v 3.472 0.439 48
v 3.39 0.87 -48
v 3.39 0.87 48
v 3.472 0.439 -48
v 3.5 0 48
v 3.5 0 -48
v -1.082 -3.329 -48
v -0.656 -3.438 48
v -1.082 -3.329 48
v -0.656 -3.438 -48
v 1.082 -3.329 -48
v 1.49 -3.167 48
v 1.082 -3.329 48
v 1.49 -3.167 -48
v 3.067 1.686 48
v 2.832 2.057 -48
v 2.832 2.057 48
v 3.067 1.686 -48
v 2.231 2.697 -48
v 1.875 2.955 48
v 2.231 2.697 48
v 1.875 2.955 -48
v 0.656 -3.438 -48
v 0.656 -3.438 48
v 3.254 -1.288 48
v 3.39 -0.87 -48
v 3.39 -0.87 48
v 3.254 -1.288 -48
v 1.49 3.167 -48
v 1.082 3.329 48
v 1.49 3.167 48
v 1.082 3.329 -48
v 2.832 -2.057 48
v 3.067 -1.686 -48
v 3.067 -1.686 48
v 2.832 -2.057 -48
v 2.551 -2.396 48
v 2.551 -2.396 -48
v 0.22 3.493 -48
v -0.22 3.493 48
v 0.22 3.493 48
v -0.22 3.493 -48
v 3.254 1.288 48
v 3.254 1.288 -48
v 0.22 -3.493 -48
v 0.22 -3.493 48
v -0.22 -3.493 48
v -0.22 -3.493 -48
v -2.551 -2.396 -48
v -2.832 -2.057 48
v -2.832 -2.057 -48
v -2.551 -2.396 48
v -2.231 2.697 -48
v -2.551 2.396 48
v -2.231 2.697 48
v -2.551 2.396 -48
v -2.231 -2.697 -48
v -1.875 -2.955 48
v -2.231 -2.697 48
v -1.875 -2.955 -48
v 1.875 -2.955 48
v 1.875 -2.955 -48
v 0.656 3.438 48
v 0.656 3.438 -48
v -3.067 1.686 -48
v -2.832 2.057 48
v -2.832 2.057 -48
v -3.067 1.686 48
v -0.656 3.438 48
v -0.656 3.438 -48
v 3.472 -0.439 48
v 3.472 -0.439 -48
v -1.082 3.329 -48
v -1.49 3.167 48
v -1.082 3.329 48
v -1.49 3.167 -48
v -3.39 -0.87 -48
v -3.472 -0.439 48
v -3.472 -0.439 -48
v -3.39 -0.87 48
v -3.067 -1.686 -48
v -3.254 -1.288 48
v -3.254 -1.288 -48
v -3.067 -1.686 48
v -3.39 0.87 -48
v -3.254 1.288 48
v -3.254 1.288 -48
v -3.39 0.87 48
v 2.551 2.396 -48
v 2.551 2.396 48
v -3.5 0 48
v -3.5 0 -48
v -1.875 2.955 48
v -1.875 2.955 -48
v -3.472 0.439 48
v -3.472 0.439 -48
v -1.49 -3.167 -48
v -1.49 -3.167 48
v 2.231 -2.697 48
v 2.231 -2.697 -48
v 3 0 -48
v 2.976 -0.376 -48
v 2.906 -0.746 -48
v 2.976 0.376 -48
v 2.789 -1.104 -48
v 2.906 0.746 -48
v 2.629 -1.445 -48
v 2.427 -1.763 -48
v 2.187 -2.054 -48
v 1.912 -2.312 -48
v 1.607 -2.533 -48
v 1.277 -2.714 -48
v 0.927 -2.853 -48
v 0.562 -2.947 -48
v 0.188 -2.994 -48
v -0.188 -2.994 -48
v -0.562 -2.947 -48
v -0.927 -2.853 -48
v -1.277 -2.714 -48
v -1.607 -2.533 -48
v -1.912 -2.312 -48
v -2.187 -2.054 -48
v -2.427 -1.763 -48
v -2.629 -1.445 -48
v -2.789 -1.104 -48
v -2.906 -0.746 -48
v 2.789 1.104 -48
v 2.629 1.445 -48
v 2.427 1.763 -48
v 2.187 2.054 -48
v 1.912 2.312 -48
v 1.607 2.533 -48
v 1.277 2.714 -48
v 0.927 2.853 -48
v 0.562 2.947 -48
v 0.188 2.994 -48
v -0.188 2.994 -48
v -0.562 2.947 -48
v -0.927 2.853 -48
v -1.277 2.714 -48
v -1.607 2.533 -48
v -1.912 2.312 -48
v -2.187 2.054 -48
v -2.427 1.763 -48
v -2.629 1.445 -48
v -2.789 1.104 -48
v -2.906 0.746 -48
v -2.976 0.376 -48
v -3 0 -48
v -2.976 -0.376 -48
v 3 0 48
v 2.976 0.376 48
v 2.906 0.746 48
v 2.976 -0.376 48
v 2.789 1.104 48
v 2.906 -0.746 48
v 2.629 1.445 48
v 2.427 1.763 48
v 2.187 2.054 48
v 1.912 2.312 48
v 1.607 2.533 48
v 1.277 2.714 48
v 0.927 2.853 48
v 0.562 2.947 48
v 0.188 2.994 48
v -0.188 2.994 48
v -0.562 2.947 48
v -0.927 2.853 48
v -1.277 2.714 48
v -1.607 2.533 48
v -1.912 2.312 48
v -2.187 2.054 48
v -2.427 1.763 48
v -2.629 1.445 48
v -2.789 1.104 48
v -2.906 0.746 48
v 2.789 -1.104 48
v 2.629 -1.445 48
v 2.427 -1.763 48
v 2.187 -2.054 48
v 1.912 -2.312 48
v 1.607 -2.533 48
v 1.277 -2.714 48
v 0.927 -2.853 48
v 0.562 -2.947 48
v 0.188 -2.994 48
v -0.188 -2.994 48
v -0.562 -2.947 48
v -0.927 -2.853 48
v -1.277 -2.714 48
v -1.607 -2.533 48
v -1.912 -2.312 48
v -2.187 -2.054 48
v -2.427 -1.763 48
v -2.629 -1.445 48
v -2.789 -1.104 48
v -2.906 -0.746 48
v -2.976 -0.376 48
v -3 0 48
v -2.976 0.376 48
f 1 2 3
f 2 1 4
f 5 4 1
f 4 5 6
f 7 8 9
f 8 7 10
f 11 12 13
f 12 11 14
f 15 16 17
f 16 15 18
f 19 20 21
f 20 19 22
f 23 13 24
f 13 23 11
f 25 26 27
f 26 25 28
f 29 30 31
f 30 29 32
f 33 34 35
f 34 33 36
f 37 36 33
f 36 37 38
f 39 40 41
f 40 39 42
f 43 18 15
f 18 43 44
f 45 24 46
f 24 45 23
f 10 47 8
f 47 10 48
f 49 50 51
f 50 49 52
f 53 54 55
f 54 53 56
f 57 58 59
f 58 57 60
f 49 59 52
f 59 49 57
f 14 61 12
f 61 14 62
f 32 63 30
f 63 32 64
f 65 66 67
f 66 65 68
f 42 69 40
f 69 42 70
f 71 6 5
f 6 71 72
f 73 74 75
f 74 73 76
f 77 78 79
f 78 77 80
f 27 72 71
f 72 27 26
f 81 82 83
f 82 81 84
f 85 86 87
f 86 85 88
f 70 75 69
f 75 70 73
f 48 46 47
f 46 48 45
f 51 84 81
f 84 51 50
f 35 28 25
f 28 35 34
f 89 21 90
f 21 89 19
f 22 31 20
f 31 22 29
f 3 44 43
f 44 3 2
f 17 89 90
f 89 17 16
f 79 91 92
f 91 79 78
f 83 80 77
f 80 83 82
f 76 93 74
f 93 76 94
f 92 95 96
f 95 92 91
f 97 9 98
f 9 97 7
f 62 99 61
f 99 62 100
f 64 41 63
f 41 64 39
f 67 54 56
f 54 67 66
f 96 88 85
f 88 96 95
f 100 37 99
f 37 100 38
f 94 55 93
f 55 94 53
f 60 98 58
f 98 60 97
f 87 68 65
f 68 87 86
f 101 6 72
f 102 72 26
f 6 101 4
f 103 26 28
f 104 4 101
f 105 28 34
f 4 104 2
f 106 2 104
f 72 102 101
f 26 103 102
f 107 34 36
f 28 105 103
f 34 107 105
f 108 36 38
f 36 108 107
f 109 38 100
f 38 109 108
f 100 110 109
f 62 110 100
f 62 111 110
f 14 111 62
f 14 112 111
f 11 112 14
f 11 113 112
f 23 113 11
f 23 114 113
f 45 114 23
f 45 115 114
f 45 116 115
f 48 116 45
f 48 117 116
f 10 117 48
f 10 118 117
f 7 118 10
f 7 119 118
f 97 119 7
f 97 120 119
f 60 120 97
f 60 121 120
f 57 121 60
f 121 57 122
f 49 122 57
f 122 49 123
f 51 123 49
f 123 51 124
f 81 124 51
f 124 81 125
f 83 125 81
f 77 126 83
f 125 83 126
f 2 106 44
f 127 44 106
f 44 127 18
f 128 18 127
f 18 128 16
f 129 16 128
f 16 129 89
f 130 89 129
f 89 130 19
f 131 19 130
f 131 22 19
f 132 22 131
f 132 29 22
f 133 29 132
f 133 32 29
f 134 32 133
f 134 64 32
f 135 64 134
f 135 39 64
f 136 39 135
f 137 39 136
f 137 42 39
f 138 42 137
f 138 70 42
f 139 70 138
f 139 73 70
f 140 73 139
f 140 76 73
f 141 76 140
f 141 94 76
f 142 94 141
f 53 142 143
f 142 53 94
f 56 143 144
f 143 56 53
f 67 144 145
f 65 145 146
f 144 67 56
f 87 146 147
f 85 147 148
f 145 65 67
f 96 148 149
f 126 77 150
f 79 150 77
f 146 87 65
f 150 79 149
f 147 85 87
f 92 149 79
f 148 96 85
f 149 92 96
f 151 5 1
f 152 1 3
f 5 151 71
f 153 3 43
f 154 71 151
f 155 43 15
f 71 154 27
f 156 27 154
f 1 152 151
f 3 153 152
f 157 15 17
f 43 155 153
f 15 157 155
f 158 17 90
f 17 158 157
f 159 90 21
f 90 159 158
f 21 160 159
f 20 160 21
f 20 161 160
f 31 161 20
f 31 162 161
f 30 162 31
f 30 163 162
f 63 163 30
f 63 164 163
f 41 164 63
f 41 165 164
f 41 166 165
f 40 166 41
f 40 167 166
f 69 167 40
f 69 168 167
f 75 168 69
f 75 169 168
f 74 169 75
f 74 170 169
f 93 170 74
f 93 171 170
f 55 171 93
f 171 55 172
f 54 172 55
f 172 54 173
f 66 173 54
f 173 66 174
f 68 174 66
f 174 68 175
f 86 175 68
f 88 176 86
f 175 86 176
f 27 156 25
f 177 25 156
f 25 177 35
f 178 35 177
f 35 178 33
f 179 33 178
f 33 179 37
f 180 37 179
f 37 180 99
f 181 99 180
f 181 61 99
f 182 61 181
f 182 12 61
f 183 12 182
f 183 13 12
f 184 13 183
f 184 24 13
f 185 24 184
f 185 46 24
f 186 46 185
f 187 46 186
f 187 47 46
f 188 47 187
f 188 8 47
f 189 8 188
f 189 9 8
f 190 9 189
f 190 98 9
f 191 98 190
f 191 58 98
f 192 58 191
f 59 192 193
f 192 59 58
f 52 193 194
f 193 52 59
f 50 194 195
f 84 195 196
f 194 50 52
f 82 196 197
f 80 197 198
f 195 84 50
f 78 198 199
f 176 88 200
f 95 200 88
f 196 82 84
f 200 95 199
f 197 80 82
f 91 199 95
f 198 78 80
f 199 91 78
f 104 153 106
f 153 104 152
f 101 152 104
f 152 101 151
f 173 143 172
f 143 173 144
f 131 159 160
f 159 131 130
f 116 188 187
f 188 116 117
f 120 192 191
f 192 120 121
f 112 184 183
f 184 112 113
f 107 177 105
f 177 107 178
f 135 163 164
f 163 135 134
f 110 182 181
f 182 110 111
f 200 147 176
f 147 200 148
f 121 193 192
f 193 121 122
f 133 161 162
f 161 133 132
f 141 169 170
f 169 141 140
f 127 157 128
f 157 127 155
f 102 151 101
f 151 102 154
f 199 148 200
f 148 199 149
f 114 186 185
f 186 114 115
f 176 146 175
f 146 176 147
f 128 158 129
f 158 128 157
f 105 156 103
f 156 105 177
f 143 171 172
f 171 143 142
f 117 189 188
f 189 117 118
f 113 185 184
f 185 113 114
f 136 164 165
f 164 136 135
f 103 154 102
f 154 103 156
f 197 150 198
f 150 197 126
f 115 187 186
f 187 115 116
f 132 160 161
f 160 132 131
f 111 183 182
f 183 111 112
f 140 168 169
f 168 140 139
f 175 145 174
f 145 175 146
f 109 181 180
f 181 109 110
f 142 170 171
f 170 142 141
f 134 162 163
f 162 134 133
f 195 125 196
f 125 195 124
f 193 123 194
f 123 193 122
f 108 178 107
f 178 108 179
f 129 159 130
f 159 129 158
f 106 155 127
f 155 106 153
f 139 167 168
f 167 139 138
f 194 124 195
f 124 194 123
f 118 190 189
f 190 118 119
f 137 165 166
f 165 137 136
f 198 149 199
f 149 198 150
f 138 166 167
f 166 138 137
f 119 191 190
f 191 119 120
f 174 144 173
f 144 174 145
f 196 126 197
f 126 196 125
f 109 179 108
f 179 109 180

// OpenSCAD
$fn = 50;


difference() {
	union() {
		translate(v = [0, 0, -48.0000000000]) {
			cylinder(h = 96, r = 3.5000000000);
		}
	}
	union() {
		translate(v = [0, 0, -100.0000000000]) {
			cylinder(h = 200, r = 3.0000000000);
		}
	}
}
